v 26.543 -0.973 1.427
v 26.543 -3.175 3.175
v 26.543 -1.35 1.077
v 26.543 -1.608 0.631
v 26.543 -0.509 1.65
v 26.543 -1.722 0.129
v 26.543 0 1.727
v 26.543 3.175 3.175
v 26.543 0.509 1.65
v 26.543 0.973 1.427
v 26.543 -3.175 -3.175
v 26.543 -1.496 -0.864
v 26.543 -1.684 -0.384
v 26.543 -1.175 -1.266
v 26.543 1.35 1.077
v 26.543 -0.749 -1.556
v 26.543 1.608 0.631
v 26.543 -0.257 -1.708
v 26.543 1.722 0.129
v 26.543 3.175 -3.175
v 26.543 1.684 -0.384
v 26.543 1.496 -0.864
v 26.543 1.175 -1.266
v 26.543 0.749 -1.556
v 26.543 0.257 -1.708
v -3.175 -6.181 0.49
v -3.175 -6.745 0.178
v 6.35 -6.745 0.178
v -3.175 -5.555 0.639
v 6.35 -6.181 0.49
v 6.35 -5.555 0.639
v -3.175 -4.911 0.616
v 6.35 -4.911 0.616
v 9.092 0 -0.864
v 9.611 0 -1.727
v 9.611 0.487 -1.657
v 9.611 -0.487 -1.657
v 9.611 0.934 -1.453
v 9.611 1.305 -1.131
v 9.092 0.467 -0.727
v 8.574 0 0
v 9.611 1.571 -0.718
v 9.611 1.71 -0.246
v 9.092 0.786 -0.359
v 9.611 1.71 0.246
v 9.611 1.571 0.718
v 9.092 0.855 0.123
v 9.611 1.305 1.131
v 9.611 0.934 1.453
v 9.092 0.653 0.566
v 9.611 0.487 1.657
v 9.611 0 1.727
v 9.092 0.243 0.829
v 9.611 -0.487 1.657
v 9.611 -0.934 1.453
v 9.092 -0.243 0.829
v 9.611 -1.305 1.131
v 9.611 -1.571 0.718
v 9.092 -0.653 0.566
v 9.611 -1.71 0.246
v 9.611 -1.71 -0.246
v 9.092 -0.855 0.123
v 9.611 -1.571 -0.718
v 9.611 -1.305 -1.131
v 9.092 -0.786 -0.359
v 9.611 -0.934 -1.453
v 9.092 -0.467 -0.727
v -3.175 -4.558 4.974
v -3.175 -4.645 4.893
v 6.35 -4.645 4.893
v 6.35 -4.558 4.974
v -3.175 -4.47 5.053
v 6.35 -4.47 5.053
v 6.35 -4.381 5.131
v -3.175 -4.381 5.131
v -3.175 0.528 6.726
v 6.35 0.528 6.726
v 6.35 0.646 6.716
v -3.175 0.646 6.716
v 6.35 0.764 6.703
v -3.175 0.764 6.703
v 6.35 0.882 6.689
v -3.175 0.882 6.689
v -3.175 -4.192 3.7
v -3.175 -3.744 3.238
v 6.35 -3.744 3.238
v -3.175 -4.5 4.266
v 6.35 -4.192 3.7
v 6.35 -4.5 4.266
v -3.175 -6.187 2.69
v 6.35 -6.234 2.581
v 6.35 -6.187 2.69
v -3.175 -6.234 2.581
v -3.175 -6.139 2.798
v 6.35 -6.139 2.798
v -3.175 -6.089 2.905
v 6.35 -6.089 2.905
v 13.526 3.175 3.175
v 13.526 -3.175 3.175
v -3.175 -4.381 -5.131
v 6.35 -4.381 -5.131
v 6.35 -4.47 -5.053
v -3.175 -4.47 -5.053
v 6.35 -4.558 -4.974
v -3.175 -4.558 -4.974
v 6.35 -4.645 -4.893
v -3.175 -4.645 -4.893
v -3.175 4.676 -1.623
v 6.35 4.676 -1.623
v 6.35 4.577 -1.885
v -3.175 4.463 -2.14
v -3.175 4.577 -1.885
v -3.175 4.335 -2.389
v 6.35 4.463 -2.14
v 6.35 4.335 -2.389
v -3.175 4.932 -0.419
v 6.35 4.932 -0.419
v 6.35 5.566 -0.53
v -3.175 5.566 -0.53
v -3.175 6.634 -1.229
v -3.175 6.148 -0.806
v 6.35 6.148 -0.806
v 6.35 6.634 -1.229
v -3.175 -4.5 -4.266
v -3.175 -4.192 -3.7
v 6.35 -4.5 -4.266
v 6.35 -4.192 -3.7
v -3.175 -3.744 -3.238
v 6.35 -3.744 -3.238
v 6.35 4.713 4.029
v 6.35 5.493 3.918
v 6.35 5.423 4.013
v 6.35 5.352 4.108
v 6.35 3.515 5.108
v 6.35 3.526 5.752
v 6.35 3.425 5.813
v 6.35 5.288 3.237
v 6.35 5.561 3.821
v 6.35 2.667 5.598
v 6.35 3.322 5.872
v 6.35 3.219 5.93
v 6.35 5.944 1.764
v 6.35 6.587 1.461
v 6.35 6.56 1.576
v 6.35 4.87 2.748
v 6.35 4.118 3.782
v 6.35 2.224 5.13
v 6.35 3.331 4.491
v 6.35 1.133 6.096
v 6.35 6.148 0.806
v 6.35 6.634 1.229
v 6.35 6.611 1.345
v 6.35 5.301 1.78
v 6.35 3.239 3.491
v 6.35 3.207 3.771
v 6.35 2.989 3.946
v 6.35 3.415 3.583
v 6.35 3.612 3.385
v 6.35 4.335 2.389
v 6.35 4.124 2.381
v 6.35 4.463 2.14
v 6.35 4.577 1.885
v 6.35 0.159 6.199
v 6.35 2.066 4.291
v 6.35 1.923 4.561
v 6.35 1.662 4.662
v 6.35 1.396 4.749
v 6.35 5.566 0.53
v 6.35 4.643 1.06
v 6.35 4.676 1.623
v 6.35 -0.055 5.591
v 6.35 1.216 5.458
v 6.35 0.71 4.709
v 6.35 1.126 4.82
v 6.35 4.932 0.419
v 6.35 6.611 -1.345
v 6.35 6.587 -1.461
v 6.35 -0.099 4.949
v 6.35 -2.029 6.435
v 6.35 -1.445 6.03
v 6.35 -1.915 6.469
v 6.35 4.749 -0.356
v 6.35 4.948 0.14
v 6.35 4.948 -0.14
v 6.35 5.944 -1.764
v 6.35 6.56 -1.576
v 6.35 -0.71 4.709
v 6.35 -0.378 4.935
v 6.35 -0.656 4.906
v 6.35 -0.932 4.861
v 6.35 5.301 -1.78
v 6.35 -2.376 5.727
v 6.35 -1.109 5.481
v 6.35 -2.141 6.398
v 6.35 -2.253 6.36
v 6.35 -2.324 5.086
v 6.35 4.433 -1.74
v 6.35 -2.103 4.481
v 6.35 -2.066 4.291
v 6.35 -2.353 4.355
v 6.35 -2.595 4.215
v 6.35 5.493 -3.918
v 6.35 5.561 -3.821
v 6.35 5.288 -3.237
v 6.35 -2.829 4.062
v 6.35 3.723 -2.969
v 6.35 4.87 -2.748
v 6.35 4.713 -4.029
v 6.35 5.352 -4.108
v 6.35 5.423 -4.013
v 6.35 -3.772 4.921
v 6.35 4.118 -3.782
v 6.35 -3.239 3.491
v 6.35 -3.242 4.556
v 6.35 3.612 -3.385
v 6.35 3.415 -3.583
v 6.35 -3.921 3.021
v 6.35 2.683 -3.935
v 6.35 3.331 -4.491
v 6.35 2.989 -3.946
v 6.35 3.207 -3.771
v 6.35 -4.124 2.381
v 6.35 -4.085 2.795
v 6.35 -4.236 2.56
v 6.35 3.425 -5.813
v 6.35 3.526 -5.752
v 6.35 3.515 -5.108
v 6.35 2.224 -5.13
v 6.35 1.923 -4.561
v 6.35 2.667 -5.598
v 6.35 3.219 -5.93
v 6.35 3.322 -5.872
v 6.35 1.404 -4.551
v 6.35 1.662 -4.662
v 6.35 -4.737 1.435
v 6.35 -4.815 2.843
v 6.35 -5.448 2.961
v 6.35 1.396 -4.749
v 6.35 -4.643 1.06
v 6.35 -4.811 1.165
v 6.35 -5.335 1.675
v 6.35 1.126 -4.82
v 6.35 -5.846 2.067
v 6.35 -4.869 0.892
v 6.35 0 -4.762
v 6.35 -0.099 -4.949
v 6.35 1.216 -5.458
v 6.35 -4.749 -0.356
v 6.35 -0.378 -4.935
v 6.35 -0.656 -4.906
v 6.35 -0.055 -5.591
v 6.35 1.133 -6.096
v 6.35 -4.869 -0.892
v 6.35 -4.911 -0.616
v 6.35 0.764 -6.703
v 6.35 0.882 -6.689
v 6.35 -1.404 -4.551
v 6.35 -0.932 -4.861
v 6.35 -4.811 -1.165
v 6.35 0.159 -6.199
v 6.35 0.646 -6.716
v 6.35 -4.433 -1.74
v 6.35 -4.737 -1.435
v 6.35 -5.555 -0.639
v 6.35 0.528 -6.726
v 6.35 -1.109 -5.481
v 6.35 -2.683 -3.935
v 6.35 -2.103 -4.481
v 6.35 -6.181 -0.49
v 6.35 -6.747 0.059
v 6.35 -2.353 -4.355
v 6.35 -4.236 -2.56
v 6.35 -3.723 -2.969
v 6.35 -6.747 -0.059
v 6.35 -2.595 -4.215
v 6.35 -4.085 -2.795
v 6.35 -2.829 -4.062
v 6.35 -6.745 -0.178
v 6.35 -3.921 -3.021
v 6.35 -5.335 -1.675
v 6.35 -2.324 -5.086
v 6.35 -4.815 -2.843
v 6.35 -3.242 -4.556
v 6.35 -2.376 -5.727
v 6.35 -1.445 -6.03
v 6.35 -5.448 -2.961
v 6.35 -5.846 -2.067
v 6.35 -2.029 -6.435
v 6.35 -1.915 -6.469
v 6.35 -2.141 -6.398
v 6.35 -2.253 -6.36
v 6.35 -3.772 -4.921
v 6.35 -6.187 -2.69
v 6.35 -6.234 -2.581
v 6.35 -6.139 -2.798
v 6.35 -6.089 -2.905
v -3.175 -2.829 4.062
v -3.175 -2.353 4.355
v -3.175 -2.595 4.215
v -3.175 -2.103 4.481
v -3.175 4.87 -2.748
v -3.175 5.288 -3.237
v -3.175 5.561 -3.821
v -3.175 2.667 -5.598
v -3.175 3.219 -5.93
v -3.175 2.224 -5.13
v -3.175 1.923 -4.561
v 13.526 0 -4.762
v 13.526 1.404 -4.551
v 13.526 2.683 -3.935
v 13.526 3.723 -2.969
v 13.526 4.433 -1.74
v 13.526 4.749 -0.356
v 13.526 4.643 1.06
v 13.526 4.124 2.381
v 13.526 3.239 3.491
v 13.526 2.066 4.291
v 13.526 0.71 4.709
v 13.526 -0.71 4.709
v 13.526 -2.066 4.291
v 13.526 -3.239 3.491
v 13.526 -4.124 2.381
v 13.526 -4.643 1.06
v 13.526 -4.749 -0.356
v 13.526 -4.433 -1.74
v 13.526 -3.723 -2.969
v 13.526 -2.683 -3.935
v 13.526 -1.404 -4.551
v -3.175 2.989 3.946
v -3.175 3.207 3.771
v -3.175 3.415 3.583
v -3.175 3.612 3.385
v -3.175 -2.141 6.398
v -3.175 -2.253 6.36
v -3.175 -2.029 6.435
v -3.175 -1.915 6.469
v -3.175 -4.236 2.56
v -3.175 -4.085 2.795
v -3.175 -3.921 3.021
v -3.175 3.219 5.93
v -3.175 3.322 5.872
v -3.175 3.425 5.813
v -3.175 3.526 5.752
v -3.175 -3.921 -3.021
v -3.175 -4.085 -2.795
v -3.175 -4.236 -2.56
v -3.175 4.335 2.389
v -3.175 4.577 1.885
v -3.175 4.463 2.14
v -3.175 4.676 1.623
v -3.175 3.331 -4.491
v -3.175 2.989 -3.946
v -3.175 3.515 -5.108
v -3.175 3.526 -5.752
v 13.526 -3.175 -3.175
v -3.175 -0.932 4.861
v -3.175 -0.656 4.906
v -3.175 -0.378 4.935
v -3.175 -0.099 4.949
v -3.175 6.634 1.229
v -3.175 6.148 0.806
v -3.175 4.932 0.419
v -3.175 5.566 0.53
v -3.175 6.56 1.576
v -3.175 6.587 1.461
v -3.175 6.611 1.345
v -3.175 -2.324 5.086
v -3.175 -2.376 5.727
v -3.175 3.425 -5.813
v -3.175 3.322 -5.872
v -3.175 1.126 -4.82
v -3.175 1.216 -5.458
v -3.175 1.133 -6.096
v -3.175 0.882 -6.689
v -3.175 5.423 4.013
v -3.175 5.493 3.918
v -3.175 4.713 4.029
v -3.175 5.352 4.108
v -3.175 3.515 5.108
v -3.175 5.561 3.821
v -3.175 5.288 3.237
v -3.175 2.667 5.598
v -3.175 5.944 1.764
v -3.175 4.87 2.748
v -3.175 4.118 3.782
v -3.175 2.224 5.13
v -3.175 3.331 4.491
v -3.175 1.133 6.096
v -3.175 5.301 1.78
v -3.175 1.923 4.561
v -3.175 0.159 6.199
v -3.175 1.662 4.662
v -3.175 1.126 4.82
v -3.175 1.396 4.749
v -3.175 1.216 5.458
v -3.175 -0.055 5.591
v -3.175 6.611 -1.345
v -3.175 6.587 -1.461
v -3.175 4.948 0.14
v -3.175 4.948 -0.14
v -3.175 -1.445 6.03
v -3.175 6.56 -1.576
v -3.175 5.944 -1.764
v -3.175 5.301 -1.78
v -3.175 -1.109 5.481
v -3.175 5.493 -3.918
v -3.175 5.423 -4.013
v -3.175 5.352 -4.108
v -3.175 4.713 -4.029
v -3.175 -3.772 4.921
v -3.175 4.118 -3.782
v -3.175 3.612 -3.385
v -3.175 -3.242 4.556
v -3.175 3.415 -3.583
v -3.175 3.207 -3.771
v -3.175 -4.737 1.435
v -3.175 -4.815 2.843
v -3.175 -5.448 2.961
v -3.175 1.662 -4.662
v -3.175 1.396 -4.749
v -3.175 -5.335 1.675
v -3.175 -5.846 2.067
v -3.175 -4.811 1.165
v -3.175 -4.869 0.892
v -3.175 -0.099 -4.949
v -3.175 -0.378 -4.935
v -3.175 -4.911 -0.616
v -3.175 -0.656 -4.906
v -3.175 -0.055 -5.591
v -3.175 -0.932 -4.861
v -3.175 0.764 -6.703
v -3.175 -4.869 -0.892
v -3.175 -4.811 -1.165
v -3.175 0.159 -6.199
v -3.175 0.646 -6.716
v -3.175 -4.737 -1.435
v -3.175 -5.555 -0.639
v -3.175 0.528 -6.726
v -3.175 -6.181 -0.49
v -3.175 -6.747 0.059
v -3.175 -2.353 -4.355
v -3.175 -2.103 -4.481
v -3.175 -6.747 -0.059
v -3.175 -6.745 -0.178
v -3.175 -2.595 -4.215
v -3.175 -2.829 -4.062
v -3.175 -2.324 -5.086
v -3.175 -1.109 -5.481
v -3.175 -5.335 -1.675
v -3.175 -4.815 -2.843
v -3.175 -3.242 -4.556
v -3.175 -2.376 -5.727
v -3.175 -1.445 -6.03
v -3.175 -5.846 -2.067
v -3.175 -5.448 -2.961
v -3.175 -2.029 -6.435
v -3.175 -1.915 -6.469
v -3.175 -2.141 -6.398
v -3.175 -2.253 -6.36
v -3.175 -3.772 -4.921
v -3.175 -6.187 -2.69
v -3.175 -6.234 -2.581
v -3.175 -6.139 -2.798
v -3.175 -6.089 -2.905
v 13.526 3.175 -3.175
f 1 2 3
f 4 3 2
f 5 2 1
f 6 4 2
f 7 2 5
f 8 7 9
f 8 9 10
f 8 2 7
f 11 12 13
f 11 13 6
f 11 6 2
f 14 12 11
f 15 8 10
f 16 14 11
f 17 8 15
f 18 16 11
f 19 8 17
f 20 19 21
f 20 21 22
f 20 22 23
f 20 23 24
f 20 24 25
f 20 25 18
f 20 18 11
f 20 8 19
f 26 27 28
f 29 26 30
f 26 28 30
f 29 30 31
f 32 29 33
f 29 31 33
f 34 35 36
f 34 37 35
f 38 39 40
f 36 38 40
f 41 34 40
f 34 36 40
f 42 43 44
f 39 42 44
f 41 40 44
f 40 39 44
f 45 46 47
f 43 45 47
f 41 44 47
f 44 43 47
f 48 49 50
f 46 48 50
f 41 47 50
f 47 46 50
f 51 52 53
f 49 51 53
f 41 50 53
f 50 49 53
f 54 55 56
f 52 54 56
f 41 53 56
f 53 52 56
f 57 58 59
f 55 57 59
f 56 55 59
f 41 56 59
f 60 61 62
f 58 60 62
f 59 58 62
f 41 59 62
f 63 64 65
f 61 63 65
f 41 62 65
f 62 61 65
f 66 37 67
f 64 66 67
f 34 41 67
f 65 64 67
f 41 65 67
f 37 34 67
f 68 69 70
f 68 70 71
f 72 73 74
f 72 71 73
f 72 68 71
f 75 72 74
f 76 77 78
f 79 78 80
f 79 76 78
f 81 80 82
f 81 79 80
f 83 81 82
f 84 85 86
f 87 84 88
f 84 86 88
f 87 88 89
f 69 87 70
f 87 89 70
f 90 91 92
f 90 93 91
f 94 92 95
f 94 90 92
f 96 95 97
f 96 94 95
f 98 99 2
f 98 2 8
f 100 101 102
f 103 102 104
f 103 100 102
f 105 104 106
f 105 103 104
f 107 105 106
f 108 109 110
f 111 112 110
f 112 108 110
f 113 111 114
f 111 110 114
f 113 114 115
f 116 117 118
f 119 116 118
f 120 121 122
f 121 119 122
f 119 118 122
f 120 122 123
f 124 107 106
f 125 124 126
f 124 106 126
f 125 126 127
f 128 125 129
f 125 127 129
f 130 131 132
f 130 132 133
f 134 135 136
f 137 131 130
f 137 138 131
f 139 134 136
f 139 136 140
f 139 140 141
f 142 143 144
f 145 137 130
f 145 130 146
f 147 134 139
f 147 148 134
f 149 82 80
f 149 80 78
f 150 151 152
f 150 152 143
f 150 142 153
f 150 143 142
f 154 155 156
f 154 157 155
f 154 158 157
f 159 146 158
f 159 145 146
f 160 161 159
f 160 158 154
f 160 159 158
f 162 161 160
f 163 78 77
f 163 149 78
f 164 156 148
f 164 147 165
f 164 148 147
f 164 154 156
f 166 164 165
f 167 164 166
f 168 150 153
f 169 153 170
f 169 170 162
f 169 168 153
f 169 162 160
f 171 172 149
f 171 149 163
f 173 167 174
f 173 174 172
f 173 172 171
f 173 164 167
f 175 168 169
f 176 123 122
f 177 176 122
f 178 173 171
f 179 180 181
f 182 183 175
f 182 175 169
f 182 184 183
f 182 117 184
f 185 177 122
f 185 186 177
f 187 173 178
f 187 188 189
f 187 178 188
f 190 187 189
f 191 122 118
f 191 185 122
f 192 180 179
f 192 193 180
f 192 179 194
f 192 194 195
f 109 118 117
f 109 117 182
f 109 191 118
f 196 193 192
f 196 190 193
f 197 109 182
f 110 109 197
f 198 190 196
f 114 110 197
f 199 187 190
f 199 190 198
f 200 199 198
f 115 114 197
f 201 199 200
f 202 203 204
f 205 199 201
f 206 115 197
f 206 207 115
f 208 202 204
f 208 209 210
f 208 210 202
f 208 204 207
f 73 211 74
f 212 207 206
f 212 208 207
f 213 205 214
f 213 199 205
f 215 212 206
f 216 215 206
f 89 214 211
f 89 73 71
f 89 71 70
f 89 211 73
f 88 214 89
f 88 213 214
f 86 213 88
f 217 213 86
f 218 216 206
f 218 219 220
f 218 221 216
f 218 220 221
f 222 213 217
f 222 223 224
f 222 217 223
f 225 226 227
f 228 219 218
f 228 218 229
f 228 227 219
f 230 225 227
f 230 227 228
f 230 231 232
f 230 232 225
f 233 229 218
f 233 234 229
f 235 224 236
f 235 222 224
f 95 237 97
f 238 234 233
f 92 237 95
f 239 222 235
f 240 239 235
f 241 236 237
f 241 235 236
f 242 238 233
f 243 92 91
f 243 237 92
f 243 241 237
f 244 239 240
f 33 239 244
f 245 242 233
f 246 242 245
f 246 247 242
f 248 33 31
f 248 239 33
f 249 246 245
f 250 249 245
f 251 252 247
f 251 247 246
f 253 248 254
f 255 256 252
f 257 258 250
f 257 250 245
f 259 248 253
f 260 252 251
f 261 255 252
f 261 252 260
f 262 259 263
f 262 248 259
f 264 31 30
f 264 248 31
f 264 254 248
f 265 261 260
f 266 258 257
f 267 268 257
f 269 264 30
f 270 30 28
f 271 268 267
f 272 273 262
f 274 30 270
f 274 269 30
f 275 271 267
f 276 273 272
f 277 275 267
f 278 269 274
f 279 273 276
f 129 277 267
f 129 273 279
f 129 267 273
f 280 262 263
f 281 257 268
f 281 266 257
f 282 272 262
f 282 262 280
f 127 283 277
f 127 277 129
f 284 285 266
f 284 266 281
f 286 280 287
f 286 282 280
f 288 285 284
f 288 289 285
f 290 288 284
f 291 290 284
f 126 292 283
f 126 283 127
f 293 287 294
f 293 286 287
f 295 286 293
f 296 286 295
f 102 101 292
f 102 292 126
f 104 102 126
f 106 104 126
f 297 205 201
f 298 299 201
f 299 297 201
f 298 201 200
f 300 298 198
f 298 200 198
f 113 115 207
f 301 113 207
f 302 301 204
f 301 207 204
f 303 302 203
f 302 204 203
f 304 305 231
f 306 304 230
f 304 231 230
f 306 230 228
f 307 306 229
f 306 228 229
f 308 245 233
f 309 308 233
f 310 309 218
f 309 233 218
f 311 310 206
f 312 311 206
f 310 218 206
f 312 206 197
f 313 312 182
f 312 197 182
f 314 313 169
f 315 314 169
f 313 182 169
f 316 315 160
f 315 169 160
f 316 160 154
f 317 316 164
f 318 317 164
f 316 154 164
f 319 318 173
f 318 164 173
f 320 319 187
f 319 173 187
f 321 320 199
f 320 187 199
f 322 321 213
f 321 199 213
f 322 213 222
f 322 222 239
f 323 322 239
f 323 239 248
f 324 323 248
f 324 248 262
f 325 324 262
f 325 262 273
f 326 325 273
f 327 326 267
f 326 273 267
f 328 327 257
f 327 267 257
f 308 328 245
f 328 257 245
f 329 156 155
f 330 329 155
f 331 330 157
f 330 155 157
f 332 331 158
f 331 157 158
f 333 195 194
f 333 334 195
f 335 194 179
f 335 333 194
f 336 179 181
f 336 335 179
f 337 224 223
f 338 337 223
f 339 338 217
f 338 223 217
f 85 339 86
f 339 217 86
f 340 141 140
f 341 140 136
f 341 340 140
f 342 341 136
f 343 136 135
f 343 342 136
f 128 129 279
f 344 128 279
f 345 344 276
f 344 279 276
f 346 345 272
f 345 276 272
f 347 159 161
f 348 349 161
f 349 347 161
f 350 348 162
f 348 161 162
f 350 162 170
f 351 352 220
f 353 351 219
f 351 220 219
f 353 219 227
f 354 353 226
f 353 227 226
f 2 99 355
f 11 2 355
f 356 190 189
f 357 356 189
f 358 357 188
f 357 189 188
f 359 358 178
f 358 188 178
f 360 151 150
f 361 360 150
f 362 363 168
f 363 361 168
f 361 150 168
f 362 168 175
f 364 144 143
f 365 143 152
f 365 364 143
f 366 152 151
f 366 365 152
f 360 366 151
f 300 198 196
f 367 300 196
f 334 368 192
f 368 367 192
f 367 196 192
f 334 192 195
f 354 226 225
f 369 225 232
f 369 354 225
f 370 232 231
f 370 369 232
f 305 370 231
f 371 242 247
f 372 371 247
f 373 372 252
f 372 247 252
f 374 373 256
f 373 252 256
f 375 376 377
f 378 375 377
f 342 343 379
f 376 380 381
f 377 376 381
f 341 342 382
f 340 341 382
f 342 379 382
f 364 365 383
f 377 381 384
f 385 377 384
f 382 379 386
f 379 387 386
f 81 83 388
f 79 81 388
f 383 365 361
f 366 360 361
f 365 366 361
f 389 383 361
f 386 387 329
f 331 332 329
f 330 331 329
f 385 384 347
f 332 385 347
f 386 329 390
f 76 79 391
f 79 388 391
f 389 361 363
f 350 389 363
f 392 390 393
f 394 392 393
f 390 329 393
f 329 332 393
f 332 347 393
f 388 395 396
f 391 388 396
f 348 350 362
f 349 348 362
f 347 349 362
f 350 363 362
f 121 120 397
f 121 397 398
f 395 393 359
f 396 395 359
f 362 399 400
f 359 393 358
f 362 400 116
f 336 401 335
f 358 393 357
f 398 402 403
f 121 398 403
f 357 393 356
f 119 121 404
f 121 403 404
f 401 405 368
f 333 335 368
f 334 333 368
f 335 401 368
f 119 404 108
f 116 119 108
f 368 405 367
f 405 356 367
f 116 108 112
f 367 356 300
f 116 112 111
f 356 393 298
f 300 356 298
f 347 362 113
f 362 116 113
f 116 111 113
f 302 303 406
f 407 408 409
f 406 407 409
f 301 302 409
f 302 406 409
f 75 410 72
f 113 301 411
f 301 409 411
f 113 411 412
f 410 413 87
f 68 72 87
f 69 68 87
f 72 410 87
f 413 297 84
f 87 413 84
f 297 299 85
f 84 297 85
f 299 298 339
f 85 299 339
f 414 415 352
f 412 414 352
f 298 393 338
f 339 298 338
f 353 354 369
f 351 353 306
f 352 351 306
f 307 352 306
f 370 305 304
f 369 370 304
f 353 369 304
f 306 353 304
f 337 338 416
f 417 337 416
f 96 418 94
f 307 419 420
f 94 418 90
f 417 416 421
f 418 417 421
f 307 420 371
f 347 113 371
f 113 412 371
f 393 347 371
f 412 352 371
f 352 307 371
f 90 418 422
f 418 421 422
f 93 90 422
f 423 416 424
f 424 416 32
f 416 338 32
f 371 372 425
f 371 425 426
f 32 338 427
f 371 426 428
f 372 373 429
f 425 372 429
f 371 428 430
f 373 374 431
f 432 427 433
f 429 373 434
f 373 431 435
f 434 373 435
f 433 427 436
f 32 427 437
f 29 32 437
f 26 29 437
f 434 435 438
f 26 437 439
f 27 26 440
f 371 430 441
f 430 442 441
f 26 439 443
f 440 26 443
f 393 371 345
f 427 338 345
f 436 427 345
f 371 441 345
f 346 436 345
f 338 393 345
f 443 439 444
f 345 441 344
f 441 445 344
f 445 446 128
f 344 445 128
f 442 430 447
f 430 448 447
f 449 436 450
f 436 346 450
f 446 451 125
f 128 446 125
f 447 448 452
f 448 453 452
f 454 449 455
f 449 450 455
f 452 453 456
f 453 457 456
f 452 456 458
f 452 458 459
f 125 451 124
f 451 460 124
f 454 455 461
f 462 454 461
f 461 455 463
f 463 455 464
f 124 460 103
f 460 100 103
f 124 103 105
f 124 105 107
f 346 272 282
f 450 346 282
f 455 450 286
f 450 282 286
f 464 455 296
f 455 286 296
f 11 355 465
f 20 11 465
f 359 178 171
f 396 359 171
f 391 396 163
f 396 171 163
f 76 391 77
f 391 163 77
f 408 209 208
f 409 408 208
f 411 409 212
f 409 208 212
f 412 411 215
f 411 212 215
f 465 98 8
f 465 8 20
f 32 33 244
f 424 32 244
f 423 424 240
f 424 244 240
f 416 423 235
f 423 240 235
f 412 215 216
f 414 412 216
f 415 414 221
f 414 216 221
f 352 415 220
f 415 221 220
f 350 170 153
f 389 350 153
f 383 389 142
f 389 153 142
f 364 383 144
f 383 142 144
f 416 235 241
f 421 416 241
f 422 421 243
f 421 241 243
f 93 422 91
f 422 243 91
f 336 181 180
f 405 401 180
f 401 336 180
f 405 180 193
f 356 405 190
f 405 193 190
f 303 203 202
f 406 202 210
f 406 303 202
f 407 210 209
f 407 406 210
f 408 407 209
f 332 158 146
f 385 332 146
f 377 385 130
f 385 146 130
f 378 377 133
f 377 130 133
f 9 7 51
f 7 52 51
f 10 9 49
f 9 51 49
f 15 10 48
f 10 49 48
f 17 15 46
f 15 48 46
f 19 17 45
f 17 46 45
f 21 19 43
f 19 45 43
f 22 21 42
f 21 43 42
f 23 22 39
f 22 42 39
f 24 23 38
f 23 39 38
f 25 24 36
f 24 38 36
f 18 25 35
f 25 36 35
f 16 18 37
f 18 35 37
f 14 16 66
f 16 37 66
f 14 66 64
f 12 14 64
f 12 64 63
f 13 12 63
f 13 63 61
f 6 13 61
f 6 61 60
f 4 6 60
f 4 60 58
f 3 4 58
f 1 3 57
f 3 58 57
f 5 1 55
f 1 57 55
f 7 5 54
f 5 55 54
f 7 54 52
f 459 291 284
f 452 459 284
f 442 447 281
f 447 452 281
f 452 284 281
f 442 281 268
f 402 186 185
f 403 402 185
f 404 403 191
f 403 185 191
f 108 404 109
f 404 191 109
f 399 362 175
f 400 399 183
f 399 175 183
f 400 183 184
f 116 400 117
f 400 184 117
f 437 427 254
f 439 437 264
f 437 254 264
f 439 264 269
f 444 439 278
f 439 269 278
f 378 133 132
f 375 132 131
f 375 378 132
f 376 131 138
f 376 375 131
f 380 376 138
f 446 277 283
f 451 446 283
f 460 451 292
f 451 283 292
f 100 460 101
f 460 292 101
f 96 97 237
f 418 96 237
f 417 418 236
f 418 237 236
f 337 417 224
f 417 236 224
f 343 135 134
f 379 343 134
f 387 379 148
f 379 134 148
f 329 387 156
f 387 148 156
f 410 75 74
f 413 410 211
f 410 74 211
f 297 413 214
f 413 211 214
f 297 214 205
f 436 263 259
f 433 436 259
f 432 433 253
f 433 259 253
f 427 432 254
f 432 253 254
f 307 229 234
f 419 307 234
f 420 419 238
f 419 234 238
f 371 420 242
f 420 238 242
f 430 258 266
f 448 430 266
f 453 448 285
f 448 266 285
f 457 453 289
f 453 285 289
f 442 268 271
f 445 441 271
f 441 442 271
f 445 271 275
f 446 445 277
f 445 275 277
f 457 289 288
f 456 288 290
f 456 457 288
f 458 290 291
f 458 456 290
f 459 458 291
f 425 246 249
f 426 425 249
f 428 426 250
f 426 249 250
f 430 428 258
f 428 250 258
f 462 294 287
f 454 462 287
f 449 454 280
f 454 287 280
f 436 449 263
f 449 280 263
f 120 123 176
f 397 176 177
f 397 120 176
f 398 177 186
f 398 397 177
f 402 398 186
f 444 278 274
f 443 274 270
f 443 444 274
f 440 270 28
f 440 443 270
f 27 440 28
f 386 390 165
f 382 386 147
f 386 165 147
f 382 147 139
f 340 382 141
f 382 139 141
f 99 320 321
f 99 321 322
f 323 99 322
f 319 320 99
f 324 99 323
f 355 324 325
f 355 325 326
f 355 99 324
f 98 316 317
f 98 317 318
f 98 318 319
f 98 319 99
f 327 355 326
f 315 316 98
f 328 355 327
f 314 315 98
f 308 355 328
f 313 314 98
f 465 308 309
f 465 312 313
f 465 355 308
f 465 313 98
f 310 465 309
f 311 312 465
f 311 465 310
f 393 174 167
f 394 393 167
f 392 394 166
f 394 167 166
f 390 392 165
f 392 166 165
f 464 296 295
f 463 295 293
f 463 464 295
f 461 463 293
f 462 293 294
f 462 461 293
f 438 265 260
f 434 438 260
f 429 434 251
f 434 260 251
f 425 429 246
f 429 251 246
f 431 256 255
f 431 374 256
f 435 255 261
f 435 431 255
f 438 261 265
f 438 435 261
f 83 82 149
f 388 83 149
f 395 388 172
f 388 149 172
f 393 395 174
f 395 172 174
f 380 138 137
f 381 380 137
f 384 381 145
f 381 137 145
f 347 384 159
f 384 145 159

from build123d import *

# Parameters (mm, degrees)
SKETCH1_W                = 9.525
SKETCH1_H                = 6.746875
CUT_EXTRUDE1_DEPTH       = 10.525
CUT_EXTRUDE2_DEPTH       = 10.525
CUT_EXTRUDE3_DEPTH       = 10.525
CUT_EXTRUDE4_DEPTH       = 10.525
CUT_EXTRUDE5_DEPTH       = 10.525
CUT_EXTRUDE6_DEPTH       = 10.525
CUT_EXTRUDE7_DEPTH       = 10.525
CUT_EXTRUDE8_DEPTH       = 10.525
CUT_EXTRUDE9_DEPTH       = 10.525
CUT_EXTRUDE10_DEPTH      = 10.525
CUT_EXTRUDE11_DEPTH      = 10.525
CUT_EXTRUDE12_DEPTH      = 10.525
CUT_EXTRUDE13_DEPTH      = 10.525
CUT_EXTRUDE14_DEPTH      = 10.525
CUT_EXTRUDE15_DEPTH      = 10.525
SKETCH17_R               = 4.7625
BOSS_EXTRUDE1_DEPTH      = 7.1755
SKETCH18_W               = 6.35
SKETCH18_H               = 6.35
BOSS_EXTRUDE2_DEPTH      = 13.0175
M3_CLEARANCE_HOLE1_D     = 3.4544
M3_CLEARANCE_HOLE1_DEPTH = 16.93164
M3_CLEARANCE_HOLE1_TIP   = 1.037806461


with BuildPart() as part:
    # Sketch1 → Revolve1 (revolve)
    with BuildSketch(Plane(origin=(0, 0, 0), x_dir=(-1, 0, 0), z_dir=(0, 0, -1))):
        with Locations((-1.5875, 3.3734375)):
            Rectangle(SKETCH1_W, SKETCH1_H)
    revolve(axis=Axis((6.35, 0, 0), (-1, 0, 0)))

    # Sketch2 → Cut-Extrude1 (cut, through all)
    with BuildSketch(Plane(origin=(6.35, 0, 0), x_dir=(0, 0, -1), z_dir=(1, 0, 0))):
        with BuildLine():
            ThreePointArc((-4.893369276, -4.644917588), (-3.965713624, -5.458336534), (-2.905444874, -6.089229208))
            ThreePointArc((-2.905444874, -6.089229208), (-2.92382812, -5.1271904), (-2.559987212, -4.236417473))
            ThreePointArc((-2.559987212, -4.236417473), (-2.909434136, -4.004492544), (-3.23799289, -3.743817514))
            ThreePointArc((-3.23799289, -3.743817514), (-3.972735262, -4.365114753), (-4.893369276, -4.644917588))
        make_face()
    extrude(amount=-CUT_EXTRUDE1_DEPTH, mode=Mode.SUBTRACT)

    # Sketch3 → Cut-Extrude2 (cut, through all)
    with BuildSketch(Plane(origin=(6.35, 0, 0), x_dir=(0, 0, -1), z_dir=(1, 0, 0))):
        with BuildLine():
            ThreePointArc((-6.359573461, -2.253030771), (-5.842965146, -3.3734375), (-5.130968614, -4.381036789))
            ThreePointArc((-5.130968614, -4.381036789), (-4.75646611, -3.494693465), (-4.061770911, -2.828919335))
            ThreePointArc((-4.061770911, -2.828919335), (-4.286674194, -2.4749125), (-4.480801464, -2.103137126))
            ThreePointArc((-4.480801464, -2.103137126), (-5.404726374, -2.37187375), (-6.359573461, -2.253030771))
        make_face()
    extrude(amount=-CUT_EXTRUDE2_DEPTH, mode=Mode.SUBTRACT)

    # Sketch4 → Cut-Extrude3 (cut, through all)
    with BuildSketch(Plane(origin=(6.35, 0, 0), x_dir=(0, 0, -1), z_dir=(1, 0, 0))):
        with BuildLine():
            ThreePointArc((-6.726149621, 0.528425534), (-6.709914913, -0.705240476), (-6.469301267, -1.915323309))
            ThreePointArc((-6.469301267, -1.915323309), (-5.766667898, -1.257932283), (-4.861237519, -0.932275343))
            ThreePointArc((-4.861237519, -0.932275343), (-4.922709341, -0.517397601), (-4.948838759, -0.098805222))
            ThreePointArc((-4.948838759, -0.098805222), (-5.902191196, 0.031485771), (-6.726149621, 0.528425534))
        make_face()
    extrude(amount=-CUT_EXTRUDE3_DEPTH, mode=Mode.SUBTRACT)

    # Sketch5 → Cut-Extrude4 (cut, through all)
    with BuildSketch(Plane(origin=(6.35, 0, 0), x_dir=(0, 0, -1), z_dir=(1, 0, 0))):
        with BuildLine():
            ThreePointArc((-5.929713406, 3.218512264), (-6.416659433, 2.084899034), (-6.68903296, 0.881566972))
            ThreePointArc((-6.68903296, 0.881566972), (-5.779760418, 1.196336819), (-4.820151997, 1.125567525))
            ThreePointArc((-4.820151997, 1.125567525), (-4.707563321, 1.529580044), (-4.561176873, 1.922611002))
            ThreePointArc((-4.561176873, 1.922611002), (-5.37911354, 2.429401117), (-5.929713406, 3.218512264))
        make_face()
    extrude(amount=-CUT_EXTRUDE4_DEPTH, mode=Mode.SUBTRACT)

    # Sketch6 → Cut-Extrude5 (cut, through all)
    with BuildSketch(Plane(origin=(6.35, 0, 0), x_dir=(0, 0, -1), z_dir=(1, 0, 0))):
        with BuildLine():
            ThreePointArc((-5.752170086, 3.526026314), (-4.793479854, 3.443748417), (-3.945618406, 2.988789542))
            ThreePointArc((-3.945618406, 2.988789542), (-3.678436836, 3.312079404), (-3.384846069, 3.611590317))
            ThreePointArc((-3.384846069, 3.611590317), (-3.925938286, 4.40725094), (-4.107975873, 5.352088984))
            ThreePointArc((-4.107975873, 5.352088984), (-5.013905244, 4.51454056), (-5.752170086, 3.526026314))
        make_face()
    extrude(amount=-CUT_EXTRUDE5_DEPTH, mode=Mode.SUBTRACT)

    # Sketch7 → Cut-Extrude6 (cut, through all)
    with BuildSketch(Plane(origin=(6.35, 0, 0), x_dir=(0, 0, -1), z_dir=(1, 0, 0))):
        with BuildLine():
            ThreePointArc((-3.820704747, 5.560803674), (-2.978363076, 5.095704628), (-2.388851547, 4.335222695))
            ThreePointArc((-2.388851547, 4.335222695), (-2.013275204, 4.521890145), (-1.623244629, 4.676092857))
            ThreePointArc((-1.623244629, 4.676092857), (-1.793932636, 5.623047036), (-1.575931992, 6.560240897))
            ThreePointArc((-1.575931992, 6.560240897), (-2.744201289, 6.16357701), (-3.820704747, 5.560803674))
        make_face()
    extrude(amount=-CUT_EXTRUDE6_DEPTH, mode=Mode.SUBTRACT)

    # Sketch8 → Cut-Extrude7 (cut, through all)
    with BuildSketch(Plane(origin=(6.35, 0, 0), x_dir=(0, 0, -1), z_dir=(1, 0, 0))):
        with BuildLine():
            ThreePointArc((1.228604847, 6.63406756), (0, 6.746875), (-1.228604847, 6.63406756))
            ThreePointArc((-1.228604847, 6.63406756), (-0.648260265, 5.866567216), (-0.419030554, 4.93205646))
            ThreePointArc((-0.419030554, 4.93205646), (0, 4.949825), (0.419030554, 4.93205646))
            ThreePointArc((0.419030554, 4.93205646), (0.648260265, 5.866567216), (1.228604847, 6.63406756))
        make_face()
    extrude(amount=-CUT_EXTRUDE7_DEPTH, mode=Mode.SUBTRACT)

    # Sketch9 → Cut-Extrude8 (cut, through all)
    with BuildSketch(Plane(origin=(6.35, 0, 0), x_dir=(0, 0, -1), z_dir=(1, 0, 0))):
        with BuildLine():
            ThreePointArc((3.820704747, 5.560803674), (2.744201289, 6.16357701), (1.575931992, 6.560240897))
            ThreePointArc((1.575931992, 6.560240897), (1.793932636, 5.623047036), (1.623244629, 4.676092857))
            ThreePointArc((1.623244629, 4.676092857), (2.013275204, 4.521890145), (2.388851547, 4.335222695))
            ThreePointArc((2.388851547, 4.335222695), (2.978363076, 5.095704628), (3.820704747, 5.560803674))
        make_face()
    extrude(amount=-CUT_EXTRUDE8_DEPTH, mode=Mode.SUBTRACT)

    # Sketch10 → Cut-Extrude9 (cut, through all)
    with BuildSketch(Plane(origin=(6.35, 0, 0), x_dir=(0, 0, -1), z_dir=(1, 0, 0))):
        with BuildLine():
            ThreePointArc((5.752170086, 3.526026314), (5.013905244, 4.51454056), (4.107975873, 5.352088984))
            ThreePointArc((4.107975873, 5.352088984), (3.925938286, 4.40725094), (3.384846069, 3.611590317))
            ThreePointArc((3.384846069, 3.611590317), (3.678436836, 3.312079404), (3.945618406, 2.988789542))
            ThreePointArc((3.945618406, 2.988789542), (4.793479854, 3.443748417), (5.752170086, 3.526026314))
        make_face()
    extrude(amount=-CUT_EXTRUDE9_DEPTH, mode=Mode.SUBTRACT)

    # Sketch11 → Cut-Extrude10 (cut, through all)
    with BuildSketch(Plane(origin=(6.35, 0, 0), x_dir=(0, 0, -1), z_dir=(1, 0, 0))):
        with BuildLine():
            ThreePointArc((6.68903296, 0.881566972), (6.416659433, 2.084899034), (5.929713406, 3.218512264))
            ThreePointArc((5.929713406, 3.218512264), (5.37911354, 2.429401117), (4.561176873, 1.922611002))
            ThreePointArc((4.561176873, 1.922611002), (4.707563321, 1.529580044), (4.820151997, 1.125567525))
            ThreePointArc((4.820151997, 1.125567525), (5.779760418, 1.196336819), (6.68903296, 0.881566972))
        make_face()
    extrude(amount=-CUT_EXTRUDE10_DEPTH, mode=Mode.SUBTRACT)

    # Sketch12 → Cut-Extrude11 (cut, through all)
    with BuildSketch(Plane(origin=(6.35, 0, 0), x_dir=(0, 0, -1), z_dir=(1, 0, 0))):
        with BuildLine():
            ThreePointArc((6.469301267, -1.915323309), (6.709914913, -0.705240476), (6.726149621, 0.528425534))
            ThreePointArc((6.726149621, 0.528425534), (5.902191196, 0.031485771), (4.948838759, -0.098805222))
            ThreePointArc((4.948838759, -0.098805222), (4.922709341, -0.517397601), (4.861237519, -0.932275343))
            ThreePointArc((4.861237519, -0.932275343), (5.766667898, -1.257932283), (6.469301267, -1.915323309))
        make_face()
    extrude(amount=-CUT_EXTRUDE11_DEPTH, mode=Mode.SUBTRACT)

    # Sketch13 → Cut-Extrude12 (cut, through all)
    with BuildSketch(Plane(origin=(6.35, 0, 0), x_dir=(0, 0, -1), z_dir=(1, 0, 0))):
        with BuildLine():
            ThreePointArc((5.130968614, -4.381036789), (5.842965146, -3.3734375), (6.359573461, -2.253030771))
            ThreePointArc((6.359573461, -2.253030771), (5.404726374, -2.37187375), (4.480801464, -2.103137126))
            ThreePointArc((4.480801464, -2.103137126), (4.286674194, -2.4749125), (4.061770911, -2.828919335))
            ThreePointArc((4.061770911, -2.828919335), (4.75646611, -3.494693465), (5.130968614, -4.381036789))
        make_face()
    extrude(amount=-CUT_EXTRUDE12_DEPTH, mode=Mode.SUBTRACT)

    # Sketch14 → Cut-Extrude13 (cut, through all)
    with BuildSketch(Plane(origin=(6.35, 0, 0), x_dir=(0, 0, -1), z_dir=(1, 0, 0))):
        with BuildLine():
            ThreePointArc((2.905444874, -6.089229208), (3.965713624, -5.458336534), (4.893369276, -4.644917588))
            ThreePointArc((4.893369276, -4.644917588), (3.972735262, -4.365114753), (3.23799289, -3.743817514))
            ThreePointArc((3.23799289, -3.743817514), (2.909434136, -4.004492544), (2.559987212, -4.236417473))
            ThreePointArc((2.559987212, -4.236417473), (2.92382812, -5.1271904), (2.905444874, -6.089229208))
        make_face()
    extrude(amount=-CUT_EXTRUDE13_DEPTH, mode=Mode.SUBTRACT)

    # Sketch15 → Cut-Extrude14 (cut, through all)
    with BuildSketch(Plane(origin=(6.35, 0, 0), x_dir=(0, 0, -1), z_dir=(1, 0, 0))):
        with BuildLine():
            ThreePointArc((0.17754332, -6.744538578), (1.402754189, -6.599439594), (2.581057087, -6.233655956))
            ThreePointArc((2.581057087, -6.233655956), (1.853822132, -5.603587759), (1.435305929, -4.737157842))
            ThreePointArc((1.435305929, -4.737157842), (1.029126485, -4.841659448), (0.615558467, -4.911400544))
            ThreePointArc((0.615558467, -4.911400544), (0.585633687, -5.873149535), (0.17754332, -6.744538578))
        make_face()
    extrude(amount=-CUT_EXTRUDE14_DEPTH, mode=Mode.SUBTRACT)

    # Sketch16 → Cut-Extrude15 (cut, through all)
    with BuildSketch(Plane(origin=(6.35, 0, 0), x_dir=(0, 0, -1), z_dir=(1, 0, 0))):
        with BuildLine():
            ThreePointArc((-2.581057087, -6.233655956), (-1.402754189, -6.599439594), (-0.17754332, -6.744538578))
            ThreePointArc((-0.17754332, -6.744538578), (-0.585633687, -5.873149535), (-0.615558467, -4.911400544))
            ThreePointArc((-0.615558467, -4.911400544), (-1.029126485, -4.841659448), (-1.435305929, -4.737157842))
            ThreePointArc((-1.435305929, -4.737157842), (-1.853822132, -5.603587759), (-2.581057087, -6.233655956))
        make_face()
    extrude(amount=-CUT_EXTRUDE15_DEPTH, mode=Mode.SUBTRACT)

    # Sketch17 → Boss-Extrude1 (add)
    with BuildSketch(Plane(origin=(6.35, 0, 0), x_dir=(0, 0, -1), z_dir=(1, 0, 0))):
        Circle(SKETCH17_R)
    extrude(amount=BOSS_EXTRUDE1_DEPTH)

    # Sketch18 → Boss-Extrude2 (add)
    with BuildSketch(Plane(origin=(13.5255, 0, 0), x_dir=(0, 0, -1), z_dir=(1, 0, 0))):
        Rectangle(SKETCH18_W, SKETCH18_H)
    extrude(amount=BOSS_EXTRUDE2_DEPTH)

    # M3 Clearance Hole1
    with Locations(Plane(origin=(26.543, 0, 0), x_dir=(0, 0, -1), z_dir=(1, 0, 0))):
        with Locations((0, 0)):
            Hole(M3_CLEARANCE_HOLE1_D / 2, depth=M3_CLEARANCE_HOLE1_DEPTH)
            with Locations((0, 0, -(M3_CLEARANCE_HOLE1_DEPTH + M3_CLEARANCE_HOLE1_TIP / 2))):  # 118° drill point
                Cone(0, M3_CLEARANCE_HOLE1_D / 2, M3_CLEARANCE_HOLE1_TIP, mode=Mode.SUBTRACT)


solid = part.part
